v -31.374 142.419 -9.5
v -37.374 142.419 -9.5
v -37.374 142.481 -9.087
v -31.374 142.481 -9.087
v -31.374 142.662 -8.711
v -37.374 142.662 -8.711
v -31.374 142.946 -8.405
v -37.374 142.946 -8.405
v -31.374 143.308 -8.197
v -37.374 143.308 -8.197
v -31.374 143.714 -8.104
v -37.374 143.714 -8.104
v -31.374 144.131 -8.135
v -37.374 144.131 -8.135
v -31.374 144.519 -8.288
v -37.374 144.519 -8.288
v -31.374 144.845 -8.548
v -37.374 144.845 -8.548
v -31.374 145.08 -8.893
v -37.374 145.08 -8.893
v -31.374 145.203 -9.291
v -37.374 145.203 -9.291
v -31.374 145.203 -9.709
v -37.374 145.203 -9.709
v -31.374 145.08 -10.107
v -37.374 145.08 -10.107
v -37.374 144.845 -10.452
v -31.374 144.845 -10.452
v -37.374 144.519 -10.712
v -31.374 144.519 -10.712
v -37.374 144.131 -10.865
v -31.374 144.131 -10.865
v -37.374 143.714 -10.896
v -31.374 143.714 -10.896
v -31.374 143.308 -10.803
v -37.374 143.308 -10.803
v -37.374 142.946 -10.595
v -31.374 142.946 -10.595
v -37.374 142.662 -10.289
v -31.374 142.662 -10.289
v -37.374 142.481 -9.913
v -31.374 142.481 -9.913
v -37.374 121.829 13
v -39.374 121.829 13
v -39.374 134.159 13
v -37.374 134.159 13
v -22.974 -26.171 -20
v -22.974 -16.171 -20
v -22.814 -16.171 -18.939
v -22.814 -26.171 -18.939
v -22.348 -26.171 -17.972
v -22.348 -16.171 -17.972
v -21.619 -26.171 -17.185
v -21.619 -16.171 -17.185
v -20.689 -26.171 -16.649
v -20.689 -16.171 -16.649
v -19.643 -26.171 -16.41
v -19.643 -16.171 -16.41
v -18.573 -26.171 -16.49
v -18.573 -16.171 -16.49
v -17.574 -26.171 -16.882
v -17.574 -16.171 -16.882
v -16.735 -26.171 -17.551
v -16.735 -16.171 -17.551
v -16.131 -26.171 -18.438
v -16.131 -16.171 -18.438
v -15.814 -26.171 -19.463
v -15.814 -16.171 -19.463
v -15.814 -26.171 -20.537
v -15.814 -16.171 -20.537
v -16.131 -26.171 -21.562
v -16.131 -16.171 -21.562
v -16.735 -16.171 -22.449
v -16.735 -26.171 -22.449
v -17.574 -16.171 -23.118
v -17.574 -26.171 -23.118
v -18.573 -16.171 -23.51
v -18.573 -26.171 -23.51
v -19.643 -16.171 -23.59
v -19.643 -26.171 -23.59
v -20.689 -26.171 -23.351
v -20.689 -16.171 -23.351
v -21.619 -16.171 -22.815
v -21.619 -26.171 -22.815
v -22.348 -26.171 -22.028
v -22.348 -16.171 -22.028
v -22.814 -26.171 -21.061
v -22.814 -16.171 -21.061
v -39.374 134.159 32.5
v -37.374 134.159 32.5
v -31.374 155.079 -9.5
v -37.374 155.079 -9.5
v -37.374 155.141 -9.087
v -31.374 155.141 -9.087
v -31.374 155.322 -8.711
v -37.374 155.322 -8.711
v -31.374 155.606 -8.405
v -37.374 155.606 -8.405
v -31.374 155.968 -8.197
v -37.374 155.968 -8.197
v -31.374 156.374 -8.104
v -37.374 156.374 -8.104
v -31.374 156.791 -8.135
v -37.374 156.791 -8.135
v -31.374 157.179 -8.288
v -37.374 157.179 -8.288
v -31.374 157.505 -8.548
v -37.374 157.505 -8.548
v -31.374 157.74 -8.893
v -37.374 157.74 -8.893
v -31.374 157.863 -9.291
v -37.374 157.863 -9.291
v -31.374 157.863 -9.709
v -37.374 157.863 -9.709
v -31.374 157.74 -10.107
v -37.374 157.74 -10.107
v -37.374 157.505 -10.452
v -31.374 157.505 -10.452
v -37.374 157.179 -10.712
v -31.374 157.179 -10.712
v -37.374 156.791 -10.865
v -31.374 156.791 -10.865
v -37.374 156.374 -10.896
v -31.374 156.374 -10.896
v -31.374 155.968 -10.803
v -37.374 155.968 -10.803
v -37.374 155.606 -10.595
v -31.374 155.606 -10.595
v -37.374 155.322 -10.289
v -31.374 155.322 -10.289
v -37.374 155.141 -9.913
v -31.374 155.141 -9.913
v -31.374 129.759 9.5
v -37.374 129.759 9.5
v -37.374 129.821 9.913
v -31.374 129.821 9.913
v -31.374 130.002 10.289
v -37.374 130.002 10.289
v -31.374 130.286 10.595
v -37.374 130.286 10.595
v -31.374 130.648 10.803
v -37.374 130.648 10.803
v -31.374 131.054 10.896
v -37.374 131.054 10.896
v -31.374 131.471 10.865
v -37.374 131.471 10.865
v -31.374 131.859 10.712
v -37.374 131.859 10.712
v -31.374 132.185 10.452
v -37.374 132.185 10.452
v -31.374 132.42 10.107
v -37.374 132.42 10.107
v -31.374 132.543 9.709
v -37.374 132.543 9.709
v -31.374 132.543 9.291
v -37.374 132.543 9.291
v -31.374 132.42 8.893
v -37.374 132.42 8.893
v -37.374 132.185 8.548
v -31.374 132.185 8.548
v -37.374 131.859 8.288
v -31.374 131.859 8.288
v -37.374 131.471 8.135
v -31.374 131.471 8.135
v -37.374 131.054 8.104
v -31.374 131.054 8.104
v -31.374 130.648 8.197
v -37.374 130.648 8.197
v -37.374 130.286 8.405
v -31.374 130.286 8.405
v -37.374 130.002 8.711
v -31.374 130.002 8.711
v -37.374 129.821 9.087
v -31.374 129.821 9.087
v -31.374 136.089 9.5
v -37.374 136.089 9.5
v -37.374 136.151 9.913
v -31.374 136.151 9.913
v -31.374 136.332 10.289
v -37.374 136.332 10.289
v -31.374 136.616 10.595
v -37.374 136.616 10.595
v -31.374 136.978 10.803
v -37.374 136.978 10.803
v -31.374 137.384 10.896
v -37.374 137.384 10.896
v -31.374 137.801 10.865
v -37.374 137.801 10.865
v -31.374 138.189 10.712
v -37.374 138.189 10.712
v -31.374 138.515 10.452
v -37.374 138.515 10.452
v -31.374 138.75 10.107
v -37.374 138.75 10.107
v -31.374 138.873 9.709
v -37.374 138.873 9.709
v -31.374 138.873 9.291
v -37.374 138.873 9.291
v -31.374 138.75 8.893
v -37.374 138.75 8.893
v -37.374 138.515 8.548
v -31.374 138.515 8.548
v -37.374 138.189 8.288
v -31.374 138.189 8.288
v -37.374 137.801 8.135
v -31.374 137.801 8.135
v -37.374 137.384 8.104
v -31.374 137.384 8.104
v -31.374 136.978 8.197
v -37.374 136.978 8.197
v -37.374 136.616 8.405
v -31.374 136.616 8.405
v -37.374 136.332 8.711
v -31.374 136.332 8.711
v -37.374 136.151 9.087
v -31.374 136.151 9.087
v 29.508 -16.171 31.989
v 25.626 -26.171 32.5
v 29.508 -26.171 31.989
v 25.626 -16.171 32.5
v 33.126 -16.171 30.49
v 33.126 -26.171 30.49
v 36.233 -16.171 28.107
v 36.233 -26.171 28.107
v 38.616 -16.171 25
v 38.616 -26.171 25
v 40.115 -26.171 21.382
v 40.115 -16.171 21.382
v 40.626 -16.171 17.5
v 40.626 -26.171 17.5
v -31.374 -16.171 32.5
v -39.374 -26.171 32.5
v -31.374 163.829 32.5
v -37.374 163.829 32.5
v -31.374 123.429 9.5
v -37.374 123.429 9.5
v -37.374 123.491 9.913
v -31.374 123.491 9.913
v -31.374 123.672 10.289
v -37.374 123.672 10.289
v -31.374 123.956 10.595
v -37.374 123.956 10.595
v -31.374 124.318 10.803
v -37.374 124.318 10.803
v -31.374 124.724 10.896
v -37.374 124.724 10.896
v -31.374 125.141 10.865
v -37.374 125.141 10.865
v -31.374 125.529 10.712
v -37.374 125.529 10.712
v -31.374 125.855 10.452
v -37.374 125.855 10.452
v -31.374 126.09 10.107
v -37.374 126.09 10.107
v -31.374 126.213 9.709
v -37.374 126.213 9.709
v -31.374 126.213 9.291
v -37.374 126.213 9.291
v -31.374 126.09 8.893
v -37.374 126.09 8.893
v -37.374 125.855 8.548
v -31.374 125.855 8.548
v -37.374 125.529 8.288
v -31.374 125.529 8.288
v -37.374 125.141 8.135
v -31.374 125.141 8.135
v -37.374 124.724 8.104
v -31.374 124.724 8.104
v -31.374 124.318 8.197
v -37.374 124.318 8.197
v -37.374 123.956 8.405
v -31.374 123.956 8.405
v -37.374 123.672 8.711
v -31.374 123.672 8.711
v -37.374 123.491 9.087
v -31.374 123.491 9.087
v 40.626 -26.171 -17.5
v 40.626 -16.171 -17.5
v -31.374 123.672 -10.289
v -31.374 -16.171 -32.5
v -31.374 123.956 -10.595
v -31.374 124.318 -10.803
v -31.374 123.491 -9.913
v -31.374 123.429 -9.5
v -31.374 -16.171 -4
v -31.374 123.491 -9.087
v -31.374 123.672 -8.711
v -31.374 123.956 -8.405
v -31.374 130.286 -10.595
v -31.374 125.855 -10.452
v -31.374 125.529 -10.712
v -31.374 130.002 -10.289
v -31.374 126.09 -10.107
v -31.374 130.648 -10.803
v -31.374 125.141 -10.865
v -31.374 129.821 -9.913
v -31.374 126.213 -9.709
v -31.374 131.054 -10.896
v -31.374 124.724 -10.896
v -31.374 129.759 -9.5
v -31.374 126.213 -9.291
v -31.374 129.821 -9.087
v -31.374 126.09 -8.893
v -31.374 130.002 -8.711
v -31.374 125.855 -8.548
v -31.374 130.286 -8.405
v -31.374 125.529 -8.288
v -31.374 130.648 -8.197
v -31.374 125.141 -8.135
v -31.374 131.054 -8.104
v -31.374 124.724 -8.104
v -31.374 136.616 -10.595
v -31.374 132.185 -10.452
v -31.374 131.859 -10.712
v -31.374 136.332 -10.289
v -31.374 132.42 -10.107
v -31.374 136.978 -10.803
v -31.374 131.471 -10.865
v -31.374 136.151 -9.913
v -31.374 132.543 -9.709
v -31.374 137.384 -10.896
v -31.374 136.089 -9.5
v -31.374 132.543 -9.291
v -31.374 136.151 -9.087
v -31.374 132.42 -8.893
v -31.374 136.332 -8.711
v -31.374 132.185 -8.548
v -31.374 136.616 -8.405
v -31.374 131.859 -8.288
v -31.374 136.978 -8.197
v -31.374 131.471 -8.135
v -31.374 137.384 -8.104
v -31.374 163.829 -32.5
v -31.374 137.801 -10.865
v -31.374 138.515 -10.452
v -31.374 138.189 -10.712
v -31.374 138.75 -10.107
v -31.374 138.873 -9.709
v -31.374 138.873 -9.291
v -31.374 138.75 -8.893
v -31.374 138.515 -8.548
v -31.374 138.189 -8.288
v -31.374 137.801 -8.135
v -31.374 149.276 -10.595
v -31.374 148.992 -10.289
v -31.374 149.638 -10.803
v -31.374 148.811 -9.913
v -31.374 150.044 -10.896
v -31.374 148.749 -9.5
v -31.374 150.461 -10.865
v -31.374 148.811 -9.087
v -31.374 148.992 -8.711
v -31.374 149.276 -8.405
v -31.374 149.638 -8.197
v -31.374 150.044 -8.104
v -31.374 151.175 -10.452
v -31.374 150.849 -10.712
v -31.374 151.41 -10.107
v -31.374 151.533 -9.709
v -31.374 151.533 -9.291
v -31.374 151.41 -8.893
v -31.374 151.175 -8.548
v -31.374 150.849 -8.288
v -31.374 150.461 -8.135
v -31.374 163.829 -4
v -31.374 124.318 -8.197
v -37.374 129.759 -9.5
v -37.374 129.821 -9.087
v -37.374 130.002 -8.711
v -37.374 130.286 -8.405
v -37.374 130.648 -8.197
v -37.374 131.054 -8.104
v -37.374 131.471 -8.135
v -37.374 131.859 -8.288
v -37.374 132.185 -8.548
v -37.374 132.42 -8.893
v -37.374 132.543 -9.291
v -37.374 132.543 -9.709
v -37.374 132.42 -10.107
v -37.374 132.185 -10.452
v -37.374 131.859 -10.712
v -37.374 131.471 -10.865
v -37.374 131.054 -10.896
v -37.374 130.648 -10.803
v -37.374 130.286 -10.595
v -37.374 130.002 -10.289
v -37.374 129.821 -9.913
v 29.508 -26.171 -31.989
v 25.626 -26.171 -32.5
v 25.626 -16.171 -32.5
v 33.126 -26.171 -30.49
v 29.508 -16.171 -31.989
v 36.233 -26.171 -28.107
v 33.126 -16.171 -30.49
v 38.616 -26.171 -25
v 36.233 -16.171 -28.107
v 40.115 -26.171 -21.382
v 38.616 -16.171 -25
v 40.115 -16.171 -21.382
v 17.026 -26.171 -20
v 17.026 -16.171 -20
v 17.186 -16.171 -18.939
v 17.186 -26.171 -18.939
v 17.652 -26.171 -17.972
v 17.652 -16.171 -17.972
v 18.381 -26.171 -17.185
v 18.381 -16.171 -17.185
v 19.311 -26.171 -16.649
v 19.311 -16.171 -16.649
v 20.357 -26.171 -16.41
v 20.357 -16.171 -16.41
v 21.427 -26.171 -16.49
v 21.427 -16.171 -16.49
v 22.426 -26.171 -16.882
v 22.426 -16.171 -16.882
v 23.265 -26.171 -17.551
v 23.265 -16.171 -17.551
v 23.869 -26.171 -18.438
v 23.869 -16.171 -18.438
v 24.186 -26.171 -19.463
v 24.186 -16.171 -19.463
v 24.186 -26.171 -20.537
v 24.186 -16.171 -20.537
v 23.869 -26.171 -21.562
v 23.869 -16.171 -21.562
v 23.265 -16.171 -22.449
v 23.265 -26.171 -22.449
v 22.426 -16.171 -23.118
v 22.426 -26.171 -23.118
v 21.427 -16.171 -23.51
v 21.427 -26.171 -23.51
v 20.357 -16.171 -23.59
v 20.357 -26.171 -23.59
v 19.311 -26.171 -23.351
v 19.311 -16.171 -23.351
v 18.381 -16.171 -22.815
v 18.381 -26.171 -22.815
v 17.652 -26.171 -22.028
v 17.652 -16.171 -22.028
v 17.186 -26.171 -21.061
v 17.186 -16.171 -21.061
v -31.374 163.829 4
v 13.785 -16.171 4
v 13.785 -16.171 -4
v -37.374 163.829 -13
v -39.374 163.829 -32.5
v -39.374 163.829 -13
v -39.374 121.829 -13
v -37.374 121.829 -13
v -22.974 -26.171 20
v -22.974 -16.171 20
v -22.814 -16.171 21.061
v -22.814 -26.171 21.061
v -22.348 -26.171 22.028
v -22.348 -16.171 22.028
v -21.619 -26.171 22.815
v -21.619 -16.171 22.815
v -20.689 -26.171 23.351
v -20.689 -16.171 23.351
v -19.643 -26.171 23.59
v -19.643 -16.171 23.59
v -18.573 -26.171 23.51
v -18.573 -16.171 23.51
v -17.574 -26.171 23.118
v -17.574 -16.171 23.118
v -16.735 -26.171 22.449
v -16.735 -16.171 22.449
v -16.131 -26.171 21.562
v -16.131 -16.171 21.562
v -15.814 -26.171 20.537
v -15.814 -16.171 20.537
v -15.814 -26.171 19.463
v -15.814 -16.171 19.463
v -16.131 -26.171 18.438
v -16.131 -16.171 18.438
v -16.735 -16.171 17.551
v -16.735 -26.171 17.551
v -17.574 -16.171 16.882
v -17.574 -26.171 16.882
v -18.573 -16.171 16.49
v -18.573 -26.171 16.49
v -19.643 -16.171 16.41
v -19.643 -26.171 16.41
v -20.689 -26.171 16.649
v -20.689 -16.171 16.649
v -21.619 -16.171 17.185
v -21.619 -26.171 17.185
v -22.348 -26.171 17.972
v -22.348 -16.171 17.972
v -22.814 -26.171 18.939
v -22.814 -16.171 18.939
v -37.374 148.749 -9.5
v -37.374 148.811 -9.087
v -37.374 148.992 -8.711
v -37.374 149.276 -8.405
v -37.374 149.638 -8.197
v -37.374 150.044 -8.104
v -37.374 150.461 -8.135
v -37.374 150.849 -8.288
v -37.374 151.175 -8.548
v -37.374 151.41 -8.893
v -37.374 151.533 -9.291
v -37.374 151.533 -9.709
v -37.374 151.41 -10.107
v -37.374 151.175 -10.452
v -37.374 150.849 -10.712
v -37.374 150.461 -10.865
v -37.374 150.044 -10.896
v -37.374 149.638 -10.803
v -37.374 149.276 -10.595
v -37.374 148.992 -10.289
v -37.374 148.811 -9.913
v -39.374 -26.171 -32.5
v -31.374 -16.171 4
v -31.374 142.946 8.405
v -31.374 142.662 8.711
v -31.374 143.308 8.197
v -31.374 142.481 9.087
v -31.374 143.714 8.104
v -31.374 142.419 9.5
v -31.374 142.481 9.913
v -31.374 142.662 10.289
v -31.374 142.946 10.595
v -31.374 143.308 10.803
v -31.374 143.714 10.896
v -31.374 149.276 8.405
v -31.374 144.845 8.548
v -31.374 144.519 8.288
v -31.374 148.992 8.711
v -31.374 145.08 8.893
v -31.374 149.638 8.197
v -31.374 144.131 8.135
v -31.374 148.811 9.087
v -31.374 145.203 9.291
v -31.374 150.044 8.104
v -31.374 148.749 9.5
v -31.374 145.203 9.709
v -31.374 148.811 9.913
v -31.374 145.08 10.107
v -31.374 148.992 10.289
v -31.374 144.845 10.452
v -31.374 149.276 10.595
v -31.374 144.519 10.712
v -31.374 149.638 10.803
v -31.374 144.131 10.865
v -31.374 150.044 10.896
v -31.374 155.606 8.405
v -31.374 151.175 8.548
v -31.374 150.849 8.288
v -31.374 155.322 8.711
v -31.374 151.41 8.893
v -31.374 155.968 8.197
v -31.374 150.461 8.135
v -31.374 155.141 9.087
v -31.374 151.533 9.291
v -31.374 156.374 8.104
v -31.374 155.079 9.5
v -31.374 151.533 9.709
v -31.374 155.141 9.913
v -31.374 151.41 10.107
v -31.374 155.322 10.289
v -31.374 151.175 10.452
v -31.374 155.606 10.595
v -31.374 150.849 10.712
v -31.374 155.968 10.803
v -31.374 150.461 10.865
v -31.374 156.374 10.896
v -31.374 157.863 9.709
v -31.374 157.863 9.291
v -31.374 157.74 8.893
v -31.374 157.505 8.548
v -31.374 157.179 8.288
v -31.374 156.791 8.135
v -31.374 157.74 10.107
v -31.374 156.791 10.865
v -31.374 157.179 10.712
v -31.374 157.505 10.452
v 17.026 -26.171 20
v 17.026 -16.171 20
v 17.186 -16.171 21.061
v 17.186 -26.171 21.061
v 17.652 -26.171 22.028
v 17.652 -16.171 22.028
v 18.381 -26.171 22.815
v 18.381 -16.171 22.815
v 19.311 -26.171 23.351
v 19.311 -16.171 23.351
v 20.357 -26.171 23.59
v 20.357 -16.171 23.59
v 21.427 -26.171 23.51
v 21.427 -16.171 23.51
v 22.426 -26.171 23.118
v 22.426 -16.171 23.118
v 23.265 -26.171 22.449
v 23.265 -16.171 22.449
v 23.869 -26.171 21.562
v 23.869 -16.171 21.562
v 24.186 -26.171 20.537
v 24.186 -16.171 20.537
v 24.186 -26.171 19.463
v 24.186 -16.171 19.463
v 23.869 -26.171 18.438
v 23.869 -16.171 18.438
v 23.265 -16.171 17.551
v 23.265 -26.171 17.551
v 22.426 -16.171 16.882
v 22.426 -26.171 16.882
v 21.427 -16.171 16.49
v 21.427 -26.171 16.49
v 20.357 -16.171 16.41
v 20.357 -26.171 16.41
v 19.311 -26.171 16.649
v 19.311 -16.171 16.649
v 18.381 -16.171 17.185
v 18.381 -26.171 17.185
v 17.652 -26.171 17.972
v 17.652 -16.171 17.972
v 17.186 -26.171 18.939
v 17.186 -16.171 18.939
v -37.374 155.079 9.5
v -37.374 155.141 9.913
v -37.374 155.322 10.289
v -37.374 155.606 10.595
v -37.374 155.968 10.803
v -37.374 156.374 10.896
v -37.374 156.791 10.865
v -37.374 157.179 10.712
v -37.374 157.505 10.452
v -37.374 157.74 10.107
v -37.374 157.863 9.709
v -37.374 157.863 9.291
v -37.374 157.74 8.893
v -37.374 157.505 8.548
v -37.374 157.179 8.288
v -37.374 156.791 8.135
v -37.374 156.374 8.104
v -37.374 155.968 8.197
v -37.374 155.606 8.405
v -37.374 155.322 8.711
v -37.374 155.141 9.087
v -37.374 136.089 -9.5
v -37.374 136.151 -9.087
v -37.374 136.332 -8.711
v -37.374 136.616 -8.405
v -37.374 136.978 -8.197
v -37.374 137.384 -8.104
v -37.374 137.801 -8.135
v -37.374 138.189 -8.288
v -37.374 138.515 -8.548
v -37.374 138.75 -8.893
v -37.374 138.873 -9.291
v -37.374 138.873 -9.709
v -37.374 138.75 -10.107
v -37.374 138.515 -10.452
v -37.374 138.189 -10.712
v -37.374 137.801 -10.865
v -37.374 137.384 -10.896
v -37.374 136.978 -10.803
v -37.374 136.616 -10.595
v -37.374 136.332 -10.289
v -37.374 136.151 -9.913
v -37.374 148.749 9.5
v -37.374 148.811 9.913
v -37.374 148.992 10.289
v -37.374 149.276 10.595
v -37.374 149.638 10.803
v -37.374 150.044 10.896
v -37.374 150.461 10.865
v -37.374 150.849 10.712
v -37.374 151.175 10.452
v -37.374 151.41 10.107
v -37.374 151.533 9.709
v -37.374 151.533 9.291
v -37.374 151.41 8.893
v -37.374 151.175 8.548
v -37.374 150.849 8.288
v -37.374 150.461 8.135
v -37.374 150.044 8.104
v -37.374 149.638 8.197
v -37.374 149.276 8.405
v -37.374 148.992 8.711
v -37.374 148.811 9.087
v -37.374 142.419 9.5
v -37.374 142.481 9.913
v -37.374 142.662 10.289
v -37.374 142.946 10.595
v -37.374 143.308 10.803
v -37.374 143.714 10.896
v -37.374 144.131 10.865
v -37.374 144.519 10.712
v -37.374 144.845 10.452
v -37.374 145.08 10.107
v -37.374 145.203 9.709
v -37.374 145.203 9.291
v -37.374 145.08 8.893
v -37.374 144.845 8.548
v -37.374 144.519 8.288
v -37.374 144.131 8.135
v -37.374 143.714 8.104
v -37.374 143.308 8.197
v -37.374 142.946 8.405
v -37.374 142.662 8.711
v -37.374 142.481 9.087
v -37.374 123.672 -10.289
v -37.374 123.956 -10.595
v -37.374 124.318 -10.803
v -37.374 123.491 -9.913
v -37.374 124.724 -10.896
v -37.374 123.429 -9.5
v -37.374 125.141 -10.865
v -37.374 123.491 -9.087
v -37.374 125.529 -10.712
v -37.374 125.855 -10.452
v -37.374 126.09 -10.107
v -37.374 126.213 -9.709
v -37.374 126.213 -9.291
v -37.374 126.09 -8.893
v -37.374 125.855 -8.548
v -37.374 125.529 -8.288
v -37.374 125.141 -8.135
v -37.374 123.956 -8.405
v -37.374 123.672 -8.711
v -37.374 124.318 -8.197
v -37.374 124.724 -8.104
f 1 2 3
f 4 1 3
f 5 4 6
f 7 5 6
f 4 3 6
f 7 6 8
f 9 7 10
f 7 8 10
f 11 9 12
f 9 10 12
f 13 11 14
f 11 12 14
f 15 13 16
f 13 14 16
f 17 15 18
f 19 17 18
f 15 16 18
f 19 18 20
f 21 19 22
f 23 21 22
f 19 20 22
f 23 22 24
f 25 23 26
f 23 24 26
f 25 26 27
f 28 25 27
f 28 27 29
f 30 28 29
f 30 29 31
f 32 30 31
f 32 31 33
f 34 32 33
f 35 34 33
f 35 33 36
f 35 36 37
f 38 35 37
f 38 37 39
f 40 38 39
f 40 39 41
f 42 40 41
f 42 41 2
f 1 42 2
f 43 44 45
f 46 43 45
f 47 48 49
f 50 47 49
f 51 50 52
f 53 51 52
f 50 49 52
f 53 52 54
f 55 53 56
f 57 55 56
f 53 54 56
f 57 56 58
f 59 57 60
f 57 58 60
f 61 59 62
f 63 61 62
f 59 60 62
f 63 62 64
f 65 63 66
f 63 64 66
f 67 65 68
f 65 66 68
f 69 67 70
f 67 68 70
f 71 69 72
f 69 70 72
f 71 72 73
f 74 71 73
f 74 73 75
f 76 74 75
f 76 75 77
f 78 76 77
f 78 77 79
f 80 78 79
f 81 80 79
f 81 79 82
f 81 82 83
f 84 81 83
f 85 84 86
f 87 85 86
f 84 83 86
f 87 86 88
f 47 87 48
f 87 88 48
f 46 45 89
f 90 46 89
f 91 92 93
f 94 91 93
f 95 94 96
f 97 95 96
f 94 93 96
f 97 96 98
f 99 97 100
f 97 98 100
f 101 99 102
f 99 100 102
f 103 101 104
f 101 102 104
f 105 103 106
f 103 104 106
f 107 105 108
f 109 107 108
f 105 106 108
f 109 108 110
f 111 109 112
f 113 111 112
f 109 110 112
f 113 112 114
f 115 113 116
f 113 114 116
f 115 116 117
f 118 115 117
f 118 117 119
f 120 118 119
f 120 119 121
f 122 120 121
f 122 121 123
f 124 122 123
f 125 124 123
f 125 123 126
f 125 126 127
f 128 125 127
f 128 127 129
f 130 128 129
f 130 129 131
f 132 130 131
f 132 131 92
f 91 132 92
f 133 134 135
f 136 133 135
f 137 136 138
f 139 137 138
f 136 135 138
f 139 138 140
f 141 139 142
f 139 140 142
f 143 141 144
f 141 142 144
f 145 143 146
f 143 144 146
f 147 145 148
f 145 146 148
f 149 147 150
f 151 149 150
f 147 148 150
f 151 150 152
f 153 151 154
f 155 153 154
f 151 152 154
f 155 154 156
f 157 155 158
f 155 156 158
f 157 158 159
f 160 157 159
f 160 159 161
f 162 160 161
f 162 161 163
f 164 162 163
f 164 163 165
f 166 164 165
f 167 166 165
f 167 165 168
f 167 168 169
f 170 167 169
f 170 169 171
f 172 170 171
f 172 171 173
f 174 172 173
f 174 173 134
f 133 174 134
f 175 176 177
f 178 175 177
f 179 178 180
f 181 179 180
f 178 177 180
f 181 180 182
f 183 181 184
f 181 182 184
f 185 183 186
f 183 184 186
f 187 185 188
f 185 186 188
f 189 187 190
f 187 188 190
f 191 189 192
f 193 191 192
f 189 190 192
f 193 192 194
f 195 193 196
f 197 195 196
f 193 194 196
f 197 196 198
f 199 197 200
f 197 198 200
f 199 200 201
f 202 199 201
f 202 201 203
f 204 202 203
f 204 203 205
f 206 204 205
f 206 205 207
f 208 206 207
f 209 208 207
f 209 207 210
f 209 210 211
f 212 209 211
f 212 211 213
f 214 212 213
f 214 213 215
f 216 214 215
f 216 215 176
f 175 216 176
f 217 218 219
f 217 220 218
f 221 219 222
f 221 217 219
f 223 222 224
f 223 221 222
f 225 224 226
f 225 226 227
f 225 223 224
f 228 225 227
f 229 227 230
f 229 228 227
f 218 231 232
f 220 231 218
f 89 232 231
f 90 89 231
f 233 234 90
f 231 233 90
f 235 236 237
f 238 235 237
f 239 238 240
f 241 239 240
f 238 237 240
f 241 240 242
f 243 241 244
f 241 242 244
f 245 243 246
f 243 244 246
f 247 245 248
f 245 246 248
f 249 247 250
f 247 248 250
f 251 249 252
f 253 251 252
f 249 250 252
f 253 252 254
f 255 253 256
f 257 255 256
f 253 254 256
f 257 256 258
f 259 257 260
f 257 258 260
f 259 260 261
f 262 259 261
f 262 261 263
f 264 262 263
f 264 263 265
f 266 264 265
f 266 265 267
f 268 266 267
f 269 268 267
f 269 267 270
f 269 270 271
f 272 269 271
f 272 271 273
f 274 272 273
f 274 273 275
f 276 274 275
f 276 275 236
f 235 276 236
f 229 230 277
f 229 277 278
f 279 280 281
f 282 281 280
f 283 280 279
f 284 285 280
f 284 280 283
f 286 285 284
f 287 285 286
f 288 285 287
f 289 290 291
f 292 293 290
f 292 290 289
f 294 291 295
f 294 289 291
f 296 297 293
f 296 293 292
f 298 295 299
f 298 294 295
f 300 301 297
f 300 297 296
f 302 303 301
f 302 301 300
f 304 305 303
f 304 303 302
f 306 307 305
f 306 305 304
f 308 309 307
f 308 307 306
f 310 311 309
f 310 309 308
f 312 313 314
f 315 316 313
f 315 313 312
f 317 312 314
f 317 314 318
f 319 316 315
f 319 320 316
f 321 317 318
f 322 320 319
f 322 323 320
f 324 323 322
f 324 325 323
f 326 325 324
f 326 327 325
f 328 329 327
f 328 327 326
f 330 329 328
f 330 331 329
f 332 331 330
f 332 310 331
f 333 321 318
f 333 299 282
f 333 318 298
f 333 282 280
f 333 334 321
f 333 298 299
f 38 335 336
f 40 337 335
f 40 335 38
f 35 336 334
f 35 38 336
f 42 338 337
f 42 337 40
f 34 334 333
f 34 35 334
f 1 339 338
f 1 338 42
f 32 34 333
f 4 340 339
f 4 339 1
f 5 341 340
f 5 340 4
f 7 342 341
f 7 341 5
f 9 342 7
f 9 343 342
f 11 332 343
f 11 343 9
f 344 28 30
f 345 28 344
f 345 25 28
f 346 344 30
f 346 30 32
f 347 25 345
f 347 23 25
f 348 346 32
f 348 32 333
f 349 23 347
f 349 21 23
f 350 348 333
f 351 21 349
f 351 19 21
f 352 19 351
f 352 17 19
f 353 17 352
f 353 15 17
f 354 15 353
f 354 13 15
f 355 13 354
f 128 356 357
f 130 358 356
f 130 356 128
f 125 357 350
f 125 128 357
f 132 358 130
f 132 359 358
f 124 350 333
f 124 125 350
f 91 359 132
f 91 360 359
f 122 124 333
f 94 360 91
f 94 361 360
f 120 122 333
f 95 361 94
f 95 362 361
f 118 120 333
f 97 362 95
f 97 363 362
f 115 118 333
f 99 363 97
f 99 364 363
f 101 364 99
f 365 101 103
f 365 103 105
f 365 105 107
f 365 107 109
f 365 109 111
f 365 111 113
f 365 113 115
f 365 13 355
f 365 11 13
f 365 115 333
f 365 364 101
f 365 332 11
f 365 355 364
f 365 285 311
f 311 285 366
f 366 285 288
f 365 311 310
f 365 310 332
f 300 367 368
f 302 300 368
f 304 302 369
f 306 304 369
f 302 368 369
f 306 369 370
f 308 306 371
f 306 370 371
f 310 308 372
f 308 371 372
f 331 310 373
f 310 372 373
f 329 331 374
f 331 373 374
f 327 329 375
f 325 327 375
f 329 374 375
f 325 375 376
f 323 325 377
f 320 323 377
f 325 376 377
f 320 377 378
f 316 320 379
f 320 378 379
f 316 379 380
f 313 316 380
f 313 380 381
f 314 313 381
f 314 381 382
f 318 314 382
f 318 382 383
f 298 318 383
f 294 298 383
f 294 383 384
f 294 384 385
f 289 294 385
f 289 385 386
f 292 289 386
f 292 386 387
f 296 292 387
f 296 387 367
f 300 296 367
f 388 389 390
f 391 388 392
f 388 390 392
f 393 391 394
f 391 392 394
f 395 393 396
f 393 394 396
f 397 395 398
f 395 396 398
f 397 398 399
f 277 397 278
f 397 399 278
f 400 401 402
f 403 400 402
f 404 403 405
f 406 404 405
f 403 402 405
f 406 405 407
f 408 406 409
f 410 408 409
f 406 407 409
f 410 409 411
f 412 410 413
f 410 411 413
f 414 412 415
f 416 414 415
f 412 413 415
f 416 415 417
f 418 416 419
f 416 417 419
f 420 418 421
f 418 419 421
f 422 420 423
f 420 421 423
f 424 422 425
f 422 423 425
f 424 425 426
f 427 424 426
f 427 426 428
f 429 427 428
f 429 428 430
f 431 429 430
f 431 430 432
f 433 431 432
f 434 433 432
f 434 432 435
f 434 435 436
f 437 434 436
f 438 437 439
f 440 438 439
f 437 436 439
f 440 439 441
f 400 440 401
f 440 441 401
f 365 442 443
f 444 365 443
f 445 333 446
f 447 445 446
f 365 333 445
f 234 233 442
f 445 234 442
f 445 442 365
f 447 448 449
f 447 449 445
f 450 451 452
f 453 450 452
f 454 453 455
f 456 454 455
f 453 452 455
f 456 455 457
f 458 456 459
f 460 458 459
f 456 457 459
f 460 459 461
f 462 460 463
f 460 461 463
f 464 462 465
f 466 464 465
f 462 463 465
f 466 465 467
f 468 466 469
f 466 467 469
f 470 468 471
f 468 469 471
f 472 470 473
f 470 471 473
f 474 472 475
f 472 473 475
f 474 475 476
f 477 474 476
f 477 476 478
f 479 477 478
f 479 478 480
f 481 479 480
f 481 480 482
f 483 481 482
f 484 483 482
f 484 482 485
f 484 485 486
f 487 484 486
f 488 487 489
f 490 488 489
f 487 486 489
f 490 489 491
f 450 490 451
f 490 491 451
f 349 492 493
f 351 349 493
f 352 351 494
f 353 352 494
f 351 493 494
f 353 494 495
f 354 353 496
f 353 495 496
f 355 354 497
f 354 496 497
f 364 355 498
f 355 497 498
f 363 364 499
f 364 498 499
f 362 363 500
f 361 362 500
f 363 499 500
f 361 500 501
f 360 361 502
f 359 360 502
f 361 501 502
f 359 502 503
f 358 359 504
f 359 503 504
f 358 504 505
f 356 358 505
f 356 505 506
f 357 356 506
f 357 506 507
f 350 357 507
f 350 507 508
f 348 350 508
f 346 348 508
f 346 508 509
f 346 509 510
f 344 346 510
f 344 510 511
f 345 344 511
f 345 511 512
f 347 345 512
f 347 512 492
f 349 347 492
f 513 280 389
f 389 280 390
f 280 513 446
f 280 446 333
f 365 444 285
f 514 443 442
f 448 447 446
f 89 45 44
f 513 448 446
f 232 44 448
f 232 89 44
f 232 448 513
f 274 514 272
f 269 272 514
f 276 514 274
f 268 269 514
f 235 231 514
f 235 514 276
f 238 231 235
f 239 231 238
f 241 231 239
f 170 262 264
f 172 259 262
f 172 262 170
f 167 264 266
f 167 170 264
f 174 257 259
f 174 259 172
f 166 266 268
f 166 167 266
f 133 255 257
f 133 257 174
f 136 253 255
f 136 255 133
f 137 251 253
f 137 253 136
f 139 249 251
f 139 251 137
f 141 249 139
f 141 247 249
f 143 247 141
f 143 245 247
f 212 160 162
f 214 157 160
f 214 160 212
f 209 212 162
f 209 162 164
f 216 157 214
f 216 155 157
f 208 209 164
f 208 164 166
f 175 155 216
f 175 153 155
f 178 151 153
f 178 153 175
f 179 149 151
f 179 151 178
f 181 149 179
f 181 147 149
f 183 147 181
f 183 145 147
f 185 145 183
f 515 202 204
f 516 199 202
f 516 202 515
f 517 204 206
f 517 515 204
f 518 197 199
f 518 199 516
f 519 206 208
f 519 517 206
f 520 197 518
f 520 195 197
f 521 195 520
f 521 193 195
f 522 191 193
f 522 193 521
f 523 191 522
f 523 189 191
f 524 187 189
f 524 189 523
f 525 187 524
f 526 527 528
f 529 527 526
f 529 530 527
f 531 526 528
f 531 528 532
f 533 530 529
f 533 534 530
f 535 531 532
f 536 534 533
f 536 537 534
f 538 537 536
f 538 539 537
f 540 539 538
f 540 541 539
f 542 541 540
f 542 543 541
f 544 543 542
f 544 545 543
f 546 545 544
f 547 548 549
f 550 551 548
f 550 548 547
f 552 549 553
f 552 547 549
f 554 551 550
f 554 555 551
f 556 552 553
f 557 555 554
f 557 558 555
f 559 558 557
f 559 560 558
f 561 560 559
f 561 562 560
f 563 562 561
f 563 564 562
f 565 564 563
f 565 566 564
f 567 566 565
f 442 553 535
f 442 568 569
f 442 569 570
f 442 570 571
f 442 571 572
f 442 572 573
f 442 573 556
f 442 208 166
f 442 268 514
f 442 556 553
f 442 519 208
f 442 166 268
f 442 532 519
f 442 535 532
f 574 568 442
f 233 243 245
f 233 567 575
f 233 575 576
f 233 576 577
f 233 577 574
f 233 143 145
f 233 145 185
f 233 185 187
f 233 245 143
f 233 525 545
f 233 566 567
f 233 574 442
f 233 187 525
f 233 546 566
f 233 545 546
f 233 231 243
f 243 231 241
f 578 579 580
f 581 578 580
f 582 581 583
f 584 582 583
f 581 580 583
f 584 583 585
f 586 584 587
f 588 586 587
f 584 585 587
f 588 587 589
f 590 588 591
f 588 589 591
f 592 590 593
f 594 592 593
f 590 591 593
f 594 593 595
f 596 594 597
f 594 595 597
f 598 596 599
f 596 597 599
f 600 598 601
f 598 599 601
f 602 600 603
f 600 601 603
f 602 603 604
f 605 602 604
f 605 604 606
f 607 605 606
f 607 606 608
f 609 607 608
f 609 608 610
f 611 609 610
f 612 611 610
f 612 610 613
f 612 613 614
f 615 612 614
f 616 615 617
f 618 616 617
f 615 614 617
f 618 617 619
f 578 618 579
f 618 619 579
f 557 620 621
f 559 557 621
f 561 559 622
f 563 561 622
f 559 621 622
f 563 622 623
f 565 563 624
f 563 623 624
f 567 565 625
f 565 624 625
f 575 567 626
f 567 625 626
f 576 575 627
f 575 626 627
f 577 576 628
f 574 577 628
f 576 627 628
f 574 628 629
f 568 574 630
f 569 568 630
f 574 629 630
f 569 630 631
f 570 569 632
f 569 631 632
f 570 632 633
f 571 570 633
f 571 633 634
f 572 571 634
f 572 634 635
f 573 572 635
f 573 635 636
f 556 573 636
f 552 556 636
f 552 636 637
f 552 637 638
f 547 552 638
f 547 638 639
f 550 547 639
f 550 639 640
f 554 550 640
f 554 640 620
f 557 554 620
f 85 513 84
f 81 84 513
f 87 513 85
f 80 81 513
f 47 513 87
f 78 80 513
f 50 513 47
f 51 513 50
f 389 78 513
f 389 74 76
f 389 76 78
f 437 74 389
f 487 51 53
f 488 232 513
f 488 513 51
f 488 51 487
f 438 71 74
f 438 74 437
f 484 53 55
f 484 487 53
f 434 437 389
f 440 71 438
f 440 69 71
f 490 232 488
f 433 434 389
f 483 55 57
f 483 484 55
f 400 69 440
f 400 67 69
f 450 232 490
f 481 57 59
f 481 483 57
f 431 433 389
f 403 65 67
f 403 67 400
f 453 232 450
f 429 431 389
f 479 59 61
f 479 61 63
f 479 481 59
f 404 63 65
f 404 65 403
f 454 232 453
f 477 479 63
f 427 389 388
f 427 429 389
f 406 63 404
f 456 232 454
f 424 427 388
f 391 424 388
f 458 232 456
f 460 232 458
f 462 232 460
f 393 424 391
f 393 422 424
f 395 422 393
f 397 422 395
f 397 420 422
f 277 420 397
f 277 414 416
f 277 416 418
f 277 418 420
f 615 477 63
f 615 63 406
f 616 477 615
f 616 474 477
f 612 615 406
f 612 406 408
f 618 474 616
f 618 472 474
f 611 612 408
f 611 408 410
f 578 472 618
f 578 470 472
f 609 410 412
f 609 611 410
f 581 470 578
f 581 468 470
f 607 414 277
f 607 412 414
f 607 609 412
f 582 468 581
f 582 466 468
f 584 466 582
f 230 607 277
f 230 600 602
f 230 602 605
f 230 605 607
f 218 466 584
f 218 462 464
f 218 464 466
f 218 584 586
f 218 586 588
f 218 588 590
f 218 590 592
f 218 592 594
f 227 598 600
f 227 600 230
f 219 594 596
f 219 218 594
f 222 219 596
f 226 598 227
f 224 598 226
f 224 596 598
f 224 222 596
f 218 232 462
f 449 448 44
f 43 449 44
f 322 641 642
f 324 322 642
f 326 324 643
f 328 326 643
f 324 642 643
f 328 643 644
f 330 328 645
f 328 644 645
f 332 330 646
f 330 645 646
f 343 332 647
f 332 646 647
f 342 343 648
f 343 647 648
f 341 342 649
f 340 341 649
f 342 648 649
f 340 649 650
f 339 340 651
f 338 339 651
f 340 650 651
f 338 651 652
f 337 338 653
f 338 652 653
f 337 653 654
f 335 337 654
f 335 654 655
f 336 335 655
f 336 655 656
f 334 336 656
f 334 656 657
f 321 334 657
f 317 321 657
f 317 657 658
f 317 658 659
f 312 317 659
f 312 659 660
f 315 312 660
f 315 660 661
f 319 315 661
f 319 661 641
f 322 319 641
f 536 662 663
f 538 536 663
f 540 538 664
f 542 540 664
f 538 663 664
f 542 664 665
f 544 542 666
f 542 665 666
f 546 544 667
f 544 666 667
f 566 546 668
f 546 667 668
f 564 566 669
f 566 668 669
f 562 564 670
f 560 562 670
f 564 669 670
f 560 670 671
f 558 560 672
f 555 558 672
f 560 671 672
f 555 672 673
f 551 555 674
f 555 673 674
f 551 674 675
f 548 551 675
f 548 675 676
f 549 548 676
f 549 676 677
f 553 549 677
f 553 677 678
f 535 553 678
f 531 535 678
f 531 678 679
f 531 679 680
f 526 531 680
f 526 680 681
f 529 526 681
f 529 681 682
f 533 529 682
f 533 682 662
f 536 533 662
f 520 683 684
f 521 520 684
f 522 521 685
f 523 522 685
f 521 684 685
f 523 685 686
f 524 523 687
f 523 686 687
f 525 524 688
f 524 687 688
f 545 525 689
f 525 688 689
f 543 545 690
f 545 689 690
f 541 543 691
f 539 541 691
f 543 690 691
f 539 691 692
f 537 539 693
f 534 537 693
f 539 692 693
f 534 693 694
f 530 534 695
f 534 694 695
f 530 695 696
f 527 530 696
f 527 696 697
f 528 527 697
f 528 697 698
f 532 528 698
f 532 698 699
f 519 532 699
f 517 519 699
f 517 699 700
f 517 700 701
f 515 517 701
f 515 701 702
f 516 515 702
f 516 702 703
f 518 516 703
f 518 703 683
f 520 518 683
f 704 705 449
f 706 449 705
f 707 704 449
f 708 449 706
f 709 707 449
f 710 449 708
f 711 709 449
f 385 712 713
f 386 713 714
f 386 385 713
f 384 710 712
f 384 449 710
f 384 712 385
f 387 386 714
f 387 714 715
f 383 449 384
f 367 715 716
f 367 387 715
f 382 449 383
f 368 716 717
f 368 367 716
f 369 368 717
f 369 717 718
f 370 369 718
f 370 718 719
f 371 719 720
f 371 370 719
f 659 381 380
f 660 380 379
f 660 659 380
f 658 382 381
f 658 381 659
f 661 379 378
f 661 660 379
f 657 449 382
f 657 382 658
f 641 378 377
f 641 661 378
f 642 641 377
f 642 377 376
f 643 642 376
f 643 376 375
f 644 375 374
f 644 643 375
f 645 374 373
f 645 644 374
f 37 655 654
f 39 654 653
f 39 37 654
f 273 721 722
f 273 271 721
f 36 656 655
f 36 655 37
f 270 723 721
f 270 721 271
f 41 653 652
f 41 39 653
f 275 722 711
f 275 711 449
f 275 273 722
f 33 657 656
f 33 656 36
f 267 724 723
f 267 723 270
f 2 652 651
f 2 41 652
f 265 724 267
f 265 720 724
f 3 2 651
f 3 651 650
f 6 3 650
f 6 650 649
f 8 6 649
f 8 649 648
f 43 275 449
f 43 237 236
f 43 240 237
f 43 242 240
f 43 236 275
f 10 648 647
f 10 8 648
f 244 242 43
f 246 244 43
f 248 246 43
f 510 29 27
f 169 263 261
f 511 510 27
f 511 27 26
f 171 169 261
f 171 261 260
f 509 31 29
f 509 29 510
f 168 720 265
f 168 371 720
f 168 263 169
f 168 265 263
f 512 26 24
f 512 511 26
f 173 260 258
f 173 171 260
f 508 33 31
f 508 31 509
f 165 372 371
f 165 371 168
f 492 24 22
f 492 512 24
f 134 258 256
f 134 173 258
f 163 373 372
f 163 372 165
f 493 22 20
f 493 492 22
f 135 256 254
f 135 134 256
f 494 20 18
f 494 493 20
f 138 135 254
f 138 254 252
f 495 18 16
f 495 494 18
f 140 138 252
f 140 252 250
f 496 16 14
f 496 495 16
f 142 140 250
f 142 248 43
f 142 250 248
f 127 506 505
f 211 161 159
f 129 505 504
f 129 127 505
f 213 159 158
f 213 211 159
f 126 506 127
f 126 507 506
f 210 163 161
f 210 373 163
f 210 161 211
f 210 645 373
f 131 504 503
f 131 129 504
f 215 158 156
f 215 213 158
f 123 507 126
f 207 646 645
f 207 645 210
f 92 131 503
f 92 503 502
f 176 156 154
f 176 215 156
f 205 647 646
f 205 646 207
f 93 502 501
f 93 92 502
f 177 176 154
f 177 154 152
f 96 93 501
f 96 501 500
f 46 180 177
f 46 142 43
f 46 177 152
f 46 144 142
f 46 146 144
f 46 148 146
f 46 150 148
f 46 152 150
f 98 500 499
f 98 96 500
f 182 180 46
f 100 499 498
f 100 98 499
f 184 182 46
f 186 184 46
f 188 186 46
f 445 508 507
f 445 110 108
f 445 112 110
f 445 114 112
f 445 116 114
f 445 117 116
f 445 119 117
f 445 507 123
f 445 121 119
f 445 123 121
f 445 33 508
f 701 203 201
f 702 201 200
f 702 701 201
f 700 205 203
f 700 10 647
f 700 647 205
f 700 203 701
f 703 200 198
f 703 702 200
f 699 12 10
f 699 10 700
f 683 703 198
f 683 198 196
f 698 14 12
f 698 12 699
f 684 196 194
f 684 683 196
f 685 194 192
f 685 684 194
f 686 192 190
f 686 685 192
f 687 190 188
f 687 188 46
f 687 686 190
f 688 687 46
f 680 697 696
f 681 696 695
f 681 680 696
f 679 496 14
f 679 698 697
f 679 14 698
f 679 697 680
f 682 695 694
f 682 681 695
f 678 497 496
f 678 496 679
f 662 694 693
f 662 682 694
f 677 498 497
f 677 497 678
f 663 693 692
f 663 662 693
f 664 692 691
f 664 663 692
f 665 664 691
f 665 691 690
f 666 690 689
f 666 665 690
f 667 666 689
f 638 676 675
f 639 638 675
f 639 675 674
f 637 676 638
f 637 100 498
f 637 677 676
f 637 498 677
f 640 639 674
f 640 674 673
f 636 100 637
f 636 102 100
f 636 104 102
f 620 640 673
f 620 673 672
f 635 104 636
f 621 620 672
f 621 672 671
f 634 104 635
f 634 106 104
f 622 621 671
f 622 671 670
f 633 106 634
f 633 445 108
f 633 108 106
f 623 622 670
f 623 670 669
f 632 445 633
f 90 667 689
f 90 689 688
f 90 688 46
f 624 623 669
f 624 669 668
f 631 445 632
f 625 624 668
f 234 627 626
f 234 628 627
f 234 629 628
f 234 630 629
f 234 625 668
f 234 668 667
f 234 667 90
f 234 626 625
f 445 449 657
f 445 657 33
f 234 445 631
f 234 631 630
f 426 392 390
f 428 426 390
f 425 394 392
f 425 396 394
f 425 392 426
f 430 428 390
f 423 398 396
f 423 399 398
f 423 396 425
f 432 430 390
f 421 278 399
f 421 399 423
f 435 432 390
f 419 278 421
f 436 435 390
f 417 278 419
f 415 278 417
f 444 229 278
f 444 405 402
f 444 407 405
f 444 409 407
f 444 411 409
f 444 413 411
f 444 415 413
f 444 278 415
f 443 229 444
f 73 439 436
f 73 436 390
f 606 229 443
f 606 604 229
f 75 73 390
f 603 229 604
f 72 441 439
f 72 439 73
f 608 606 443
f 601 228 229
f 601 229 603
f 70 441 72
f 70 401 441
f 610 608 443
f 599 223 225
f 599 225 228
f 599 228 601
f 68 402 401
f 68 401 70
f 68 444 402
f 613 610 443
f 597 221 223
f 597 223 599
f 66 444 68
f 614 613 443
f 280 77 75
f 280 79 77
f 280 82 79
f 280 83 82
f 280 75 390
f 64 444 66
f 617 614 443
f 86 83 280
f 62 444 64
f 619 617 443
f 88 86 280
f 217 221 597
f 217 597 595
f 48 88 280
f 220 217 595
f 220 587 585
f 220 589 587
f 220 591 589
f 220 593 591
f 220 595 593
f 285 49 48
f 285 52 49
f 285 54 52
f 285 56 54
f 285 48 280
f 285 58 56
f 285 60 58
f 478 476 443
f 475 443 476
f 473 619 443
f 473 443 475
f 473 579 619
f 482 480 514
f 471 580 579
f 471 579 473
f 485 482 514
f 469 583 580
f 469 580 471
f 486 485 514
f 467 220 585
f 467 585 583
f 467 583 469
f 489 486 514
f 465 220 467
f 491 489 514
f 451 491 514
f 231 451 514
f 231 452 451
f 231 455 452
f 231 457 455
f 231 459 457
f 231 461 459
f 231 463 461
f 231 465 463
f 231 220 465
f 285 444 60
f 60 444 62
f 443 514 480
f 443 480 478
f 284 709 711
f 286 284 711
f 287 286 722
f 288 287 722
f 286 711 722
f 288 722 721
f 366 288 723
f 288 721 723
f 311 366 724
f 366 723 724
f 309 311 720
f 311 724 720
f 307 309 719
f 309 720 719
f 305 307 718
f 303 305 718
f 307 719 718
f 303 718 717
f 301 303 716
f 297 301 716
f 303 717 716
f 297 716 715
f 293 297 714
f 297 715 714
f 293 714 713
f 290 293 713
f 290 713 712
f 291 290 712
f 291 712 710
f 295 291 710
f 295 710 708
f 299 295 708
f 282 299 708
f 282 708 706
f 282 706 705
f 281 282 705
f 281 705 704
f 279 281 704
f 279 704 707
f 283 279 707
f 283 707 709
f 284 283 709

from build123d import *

# Parameters (mm, degrees)
AUFSATZ_LINEAR_AUSTRAGEN1_DEPTH = 32.5
AUFSATZ_LINEAR_AUSTRAGEN2_DEPTH = 4
SKIZZE4_W                       = 26
SKIZZE4_H                       = 42
SCHNITT_LINEAR_AUSTRAGEN1_DEPTH = 2
SKIZZE5_R                       = 1.4
SCHNITT_LINEAR_AUSTRAGEN2_DEPTH = 10
SKIZZE6_W                       = 34.028268395
SKIZZE6_H                       = 30
SCHNITT_LINEAR_AUSTRAGEN3_DEPTH = 2
SKIZZE7_R                       = 3.6
SCHNITT_LINEAR_AUSTRAGEN4_DEPTH = 10
VERRUNDUNG1_R                   = 15


with BuildPart() as part:
    # Skizze1 → Aufsatz-Linear austragen1 (new, symmetric)
    with BuildSketch(Plane.XY):
        Polygon((-39.374028295, 163.828996283), (-39.374028295, -26.171003717), (40.625971705, -26.171003717), (40.625971705, -16.171003717), (-31.374028295, -16.171003717), (-31.374028295, 163.828996283), align=None)
    extrude(amount=AUFSATZ_LINEAR_AUSTRAGEN1_DEPTH, both=True)

    # Skizze2 → Aufsatz-Linear austragen2 (add, symmetric)
    with BuildSketch(Plane.XY):
        Polygon((-31.374028295, 163.828996283), (13.784951867, -16.171003717), (-31.374028295, -16.171003717), align=None)
    extrude(amount=AUFSATZ_LINEAR_AUSTRAGEN2_DEPTH, both=True)

    # Skizze4 → Schnitt-Linear austragen1 (cut)
    with BuildSketch(Plane.ZY.offset(39.374028295)):
        with Locations((0, 142.828996283)):
            Rectangle(SKIZZE4_W, SKIZZE4_H)
    extrude(amount=-SCHNITT_LINEAR_AUSTRAGEN1_DEPTH, mode=Mode.SUBTRACT)

    # Skizze5 → Schnitt-Linear austragen2 (cut)
    with BuildSketch(Plane.ZY.offset(37.374028295)):
        with Locations(Location((-9.5, 124.828996283, 0), (0, 0, 270))):
            Circle(SKIZZE5_R)
        with Locations(Location((9.5, 124.828996283, 0), (0, 0, 270))):
            Circle(SKIZZE5_R)
        with Locations(Location((-9.5, 131.158996283, 0), (0, 0, 270))):
            Circle(SKIZZE5_R)
        with Locations(Location((9.5, 131.158996283, 0), (0, 0, 270))):
            Circle(SKIZZE5_R)
        with Locations(Location((-9.5, 137.488996283, 0), (0, 0, 270))):
            Circle(SKIZZE5_R)
        with Locations(Location((9.5, 137.488996283, 0), (0, 0, 270))):
            Circle(SKIZZE5_R)
        with Locations(Location((-9.5, 143.818996283, 0), (0, 0, 270))):
            Circle(SKIZZE5_R)
        with Locations(Location((9.5, 143.818996283, 0), (0, 0, 270))):
            Circle(SKIZZE5_R)
        with Locations(Location((-9.5, 150.148996283, 0), (0, 0, 270))):
            Circle(SKIZZE5_R)
        with Locations(Location((9.5, 150.148996283, 0), (0, 0, 270))):
            Circle(SKIZZE5_R)
        with Locations(Location((-9.5, 156.478996283, 0), (0, 0, 270))):
            Circle(SKIZZE5_R)
        with Locations(Location((9.5, 156.478996283, 0), (0, 0, 270))):
            Circle(SKIZZE5_R)
    extrude(amount=-SCHNITT_LINEAR_AUSTRAGEN2_DEPTH, mode=Mode.SUBTRACT)

    # Skizze6 → Schnitt-Linear austragen3 (cut)
    with BuildSketch(Plane.ZY.offset(39.374028295)):
        with Locations((17.014134198, 149.158996283)):
            Rectangle(SKIZZE6_W, SKIZZE6_H)
    extrude(amount=-SCHNITT_LINEAR_AUSTRAGEN3_DEPTH, mode=Mode.SUBTRACT)

    # Skizze7 → Schnitt-Linear austragen4 (cut)
    with BuildSketch(Plane(origin=(0, -16.171003717, 0), x_dir=(1, 0, 0), z_dir=(0, 1, 0))):
        with Locations(Location((20.625971705, 20, 0), (0, 0, 180))):
            Circle(SKIZZE7_R)
        with Locations(Location((20.625971705, -20, 0), (0, 0, 180))):
            Circle(SKIZZE7_R)
        with Locations(Location((-19.374028295, 20, 0), (0, 0, 180))):
            Circle(SKIZZE7_R)
        with Locations(Location((-19.374028295, -20, 0), (0, 0, 180))):
            Circle(SKIZZE7_R)
    extrude(amount=-SCHNITT_LINEAR_AUSTRAGEN4_DEPTH, mode=Mode.SUBTRACT)

    # Verrundung1
    verrundung1_edges = [part.edges().sort_by_distance(p)[0] for p in [
        (40.625971705, -21.171003717, 32.5),
        (40.625971705, -21.171003717, -32.5),
    ]]
    fillet(verrundung1_edges, radius=VERRUNDUNG1_R)


solid = part.part
